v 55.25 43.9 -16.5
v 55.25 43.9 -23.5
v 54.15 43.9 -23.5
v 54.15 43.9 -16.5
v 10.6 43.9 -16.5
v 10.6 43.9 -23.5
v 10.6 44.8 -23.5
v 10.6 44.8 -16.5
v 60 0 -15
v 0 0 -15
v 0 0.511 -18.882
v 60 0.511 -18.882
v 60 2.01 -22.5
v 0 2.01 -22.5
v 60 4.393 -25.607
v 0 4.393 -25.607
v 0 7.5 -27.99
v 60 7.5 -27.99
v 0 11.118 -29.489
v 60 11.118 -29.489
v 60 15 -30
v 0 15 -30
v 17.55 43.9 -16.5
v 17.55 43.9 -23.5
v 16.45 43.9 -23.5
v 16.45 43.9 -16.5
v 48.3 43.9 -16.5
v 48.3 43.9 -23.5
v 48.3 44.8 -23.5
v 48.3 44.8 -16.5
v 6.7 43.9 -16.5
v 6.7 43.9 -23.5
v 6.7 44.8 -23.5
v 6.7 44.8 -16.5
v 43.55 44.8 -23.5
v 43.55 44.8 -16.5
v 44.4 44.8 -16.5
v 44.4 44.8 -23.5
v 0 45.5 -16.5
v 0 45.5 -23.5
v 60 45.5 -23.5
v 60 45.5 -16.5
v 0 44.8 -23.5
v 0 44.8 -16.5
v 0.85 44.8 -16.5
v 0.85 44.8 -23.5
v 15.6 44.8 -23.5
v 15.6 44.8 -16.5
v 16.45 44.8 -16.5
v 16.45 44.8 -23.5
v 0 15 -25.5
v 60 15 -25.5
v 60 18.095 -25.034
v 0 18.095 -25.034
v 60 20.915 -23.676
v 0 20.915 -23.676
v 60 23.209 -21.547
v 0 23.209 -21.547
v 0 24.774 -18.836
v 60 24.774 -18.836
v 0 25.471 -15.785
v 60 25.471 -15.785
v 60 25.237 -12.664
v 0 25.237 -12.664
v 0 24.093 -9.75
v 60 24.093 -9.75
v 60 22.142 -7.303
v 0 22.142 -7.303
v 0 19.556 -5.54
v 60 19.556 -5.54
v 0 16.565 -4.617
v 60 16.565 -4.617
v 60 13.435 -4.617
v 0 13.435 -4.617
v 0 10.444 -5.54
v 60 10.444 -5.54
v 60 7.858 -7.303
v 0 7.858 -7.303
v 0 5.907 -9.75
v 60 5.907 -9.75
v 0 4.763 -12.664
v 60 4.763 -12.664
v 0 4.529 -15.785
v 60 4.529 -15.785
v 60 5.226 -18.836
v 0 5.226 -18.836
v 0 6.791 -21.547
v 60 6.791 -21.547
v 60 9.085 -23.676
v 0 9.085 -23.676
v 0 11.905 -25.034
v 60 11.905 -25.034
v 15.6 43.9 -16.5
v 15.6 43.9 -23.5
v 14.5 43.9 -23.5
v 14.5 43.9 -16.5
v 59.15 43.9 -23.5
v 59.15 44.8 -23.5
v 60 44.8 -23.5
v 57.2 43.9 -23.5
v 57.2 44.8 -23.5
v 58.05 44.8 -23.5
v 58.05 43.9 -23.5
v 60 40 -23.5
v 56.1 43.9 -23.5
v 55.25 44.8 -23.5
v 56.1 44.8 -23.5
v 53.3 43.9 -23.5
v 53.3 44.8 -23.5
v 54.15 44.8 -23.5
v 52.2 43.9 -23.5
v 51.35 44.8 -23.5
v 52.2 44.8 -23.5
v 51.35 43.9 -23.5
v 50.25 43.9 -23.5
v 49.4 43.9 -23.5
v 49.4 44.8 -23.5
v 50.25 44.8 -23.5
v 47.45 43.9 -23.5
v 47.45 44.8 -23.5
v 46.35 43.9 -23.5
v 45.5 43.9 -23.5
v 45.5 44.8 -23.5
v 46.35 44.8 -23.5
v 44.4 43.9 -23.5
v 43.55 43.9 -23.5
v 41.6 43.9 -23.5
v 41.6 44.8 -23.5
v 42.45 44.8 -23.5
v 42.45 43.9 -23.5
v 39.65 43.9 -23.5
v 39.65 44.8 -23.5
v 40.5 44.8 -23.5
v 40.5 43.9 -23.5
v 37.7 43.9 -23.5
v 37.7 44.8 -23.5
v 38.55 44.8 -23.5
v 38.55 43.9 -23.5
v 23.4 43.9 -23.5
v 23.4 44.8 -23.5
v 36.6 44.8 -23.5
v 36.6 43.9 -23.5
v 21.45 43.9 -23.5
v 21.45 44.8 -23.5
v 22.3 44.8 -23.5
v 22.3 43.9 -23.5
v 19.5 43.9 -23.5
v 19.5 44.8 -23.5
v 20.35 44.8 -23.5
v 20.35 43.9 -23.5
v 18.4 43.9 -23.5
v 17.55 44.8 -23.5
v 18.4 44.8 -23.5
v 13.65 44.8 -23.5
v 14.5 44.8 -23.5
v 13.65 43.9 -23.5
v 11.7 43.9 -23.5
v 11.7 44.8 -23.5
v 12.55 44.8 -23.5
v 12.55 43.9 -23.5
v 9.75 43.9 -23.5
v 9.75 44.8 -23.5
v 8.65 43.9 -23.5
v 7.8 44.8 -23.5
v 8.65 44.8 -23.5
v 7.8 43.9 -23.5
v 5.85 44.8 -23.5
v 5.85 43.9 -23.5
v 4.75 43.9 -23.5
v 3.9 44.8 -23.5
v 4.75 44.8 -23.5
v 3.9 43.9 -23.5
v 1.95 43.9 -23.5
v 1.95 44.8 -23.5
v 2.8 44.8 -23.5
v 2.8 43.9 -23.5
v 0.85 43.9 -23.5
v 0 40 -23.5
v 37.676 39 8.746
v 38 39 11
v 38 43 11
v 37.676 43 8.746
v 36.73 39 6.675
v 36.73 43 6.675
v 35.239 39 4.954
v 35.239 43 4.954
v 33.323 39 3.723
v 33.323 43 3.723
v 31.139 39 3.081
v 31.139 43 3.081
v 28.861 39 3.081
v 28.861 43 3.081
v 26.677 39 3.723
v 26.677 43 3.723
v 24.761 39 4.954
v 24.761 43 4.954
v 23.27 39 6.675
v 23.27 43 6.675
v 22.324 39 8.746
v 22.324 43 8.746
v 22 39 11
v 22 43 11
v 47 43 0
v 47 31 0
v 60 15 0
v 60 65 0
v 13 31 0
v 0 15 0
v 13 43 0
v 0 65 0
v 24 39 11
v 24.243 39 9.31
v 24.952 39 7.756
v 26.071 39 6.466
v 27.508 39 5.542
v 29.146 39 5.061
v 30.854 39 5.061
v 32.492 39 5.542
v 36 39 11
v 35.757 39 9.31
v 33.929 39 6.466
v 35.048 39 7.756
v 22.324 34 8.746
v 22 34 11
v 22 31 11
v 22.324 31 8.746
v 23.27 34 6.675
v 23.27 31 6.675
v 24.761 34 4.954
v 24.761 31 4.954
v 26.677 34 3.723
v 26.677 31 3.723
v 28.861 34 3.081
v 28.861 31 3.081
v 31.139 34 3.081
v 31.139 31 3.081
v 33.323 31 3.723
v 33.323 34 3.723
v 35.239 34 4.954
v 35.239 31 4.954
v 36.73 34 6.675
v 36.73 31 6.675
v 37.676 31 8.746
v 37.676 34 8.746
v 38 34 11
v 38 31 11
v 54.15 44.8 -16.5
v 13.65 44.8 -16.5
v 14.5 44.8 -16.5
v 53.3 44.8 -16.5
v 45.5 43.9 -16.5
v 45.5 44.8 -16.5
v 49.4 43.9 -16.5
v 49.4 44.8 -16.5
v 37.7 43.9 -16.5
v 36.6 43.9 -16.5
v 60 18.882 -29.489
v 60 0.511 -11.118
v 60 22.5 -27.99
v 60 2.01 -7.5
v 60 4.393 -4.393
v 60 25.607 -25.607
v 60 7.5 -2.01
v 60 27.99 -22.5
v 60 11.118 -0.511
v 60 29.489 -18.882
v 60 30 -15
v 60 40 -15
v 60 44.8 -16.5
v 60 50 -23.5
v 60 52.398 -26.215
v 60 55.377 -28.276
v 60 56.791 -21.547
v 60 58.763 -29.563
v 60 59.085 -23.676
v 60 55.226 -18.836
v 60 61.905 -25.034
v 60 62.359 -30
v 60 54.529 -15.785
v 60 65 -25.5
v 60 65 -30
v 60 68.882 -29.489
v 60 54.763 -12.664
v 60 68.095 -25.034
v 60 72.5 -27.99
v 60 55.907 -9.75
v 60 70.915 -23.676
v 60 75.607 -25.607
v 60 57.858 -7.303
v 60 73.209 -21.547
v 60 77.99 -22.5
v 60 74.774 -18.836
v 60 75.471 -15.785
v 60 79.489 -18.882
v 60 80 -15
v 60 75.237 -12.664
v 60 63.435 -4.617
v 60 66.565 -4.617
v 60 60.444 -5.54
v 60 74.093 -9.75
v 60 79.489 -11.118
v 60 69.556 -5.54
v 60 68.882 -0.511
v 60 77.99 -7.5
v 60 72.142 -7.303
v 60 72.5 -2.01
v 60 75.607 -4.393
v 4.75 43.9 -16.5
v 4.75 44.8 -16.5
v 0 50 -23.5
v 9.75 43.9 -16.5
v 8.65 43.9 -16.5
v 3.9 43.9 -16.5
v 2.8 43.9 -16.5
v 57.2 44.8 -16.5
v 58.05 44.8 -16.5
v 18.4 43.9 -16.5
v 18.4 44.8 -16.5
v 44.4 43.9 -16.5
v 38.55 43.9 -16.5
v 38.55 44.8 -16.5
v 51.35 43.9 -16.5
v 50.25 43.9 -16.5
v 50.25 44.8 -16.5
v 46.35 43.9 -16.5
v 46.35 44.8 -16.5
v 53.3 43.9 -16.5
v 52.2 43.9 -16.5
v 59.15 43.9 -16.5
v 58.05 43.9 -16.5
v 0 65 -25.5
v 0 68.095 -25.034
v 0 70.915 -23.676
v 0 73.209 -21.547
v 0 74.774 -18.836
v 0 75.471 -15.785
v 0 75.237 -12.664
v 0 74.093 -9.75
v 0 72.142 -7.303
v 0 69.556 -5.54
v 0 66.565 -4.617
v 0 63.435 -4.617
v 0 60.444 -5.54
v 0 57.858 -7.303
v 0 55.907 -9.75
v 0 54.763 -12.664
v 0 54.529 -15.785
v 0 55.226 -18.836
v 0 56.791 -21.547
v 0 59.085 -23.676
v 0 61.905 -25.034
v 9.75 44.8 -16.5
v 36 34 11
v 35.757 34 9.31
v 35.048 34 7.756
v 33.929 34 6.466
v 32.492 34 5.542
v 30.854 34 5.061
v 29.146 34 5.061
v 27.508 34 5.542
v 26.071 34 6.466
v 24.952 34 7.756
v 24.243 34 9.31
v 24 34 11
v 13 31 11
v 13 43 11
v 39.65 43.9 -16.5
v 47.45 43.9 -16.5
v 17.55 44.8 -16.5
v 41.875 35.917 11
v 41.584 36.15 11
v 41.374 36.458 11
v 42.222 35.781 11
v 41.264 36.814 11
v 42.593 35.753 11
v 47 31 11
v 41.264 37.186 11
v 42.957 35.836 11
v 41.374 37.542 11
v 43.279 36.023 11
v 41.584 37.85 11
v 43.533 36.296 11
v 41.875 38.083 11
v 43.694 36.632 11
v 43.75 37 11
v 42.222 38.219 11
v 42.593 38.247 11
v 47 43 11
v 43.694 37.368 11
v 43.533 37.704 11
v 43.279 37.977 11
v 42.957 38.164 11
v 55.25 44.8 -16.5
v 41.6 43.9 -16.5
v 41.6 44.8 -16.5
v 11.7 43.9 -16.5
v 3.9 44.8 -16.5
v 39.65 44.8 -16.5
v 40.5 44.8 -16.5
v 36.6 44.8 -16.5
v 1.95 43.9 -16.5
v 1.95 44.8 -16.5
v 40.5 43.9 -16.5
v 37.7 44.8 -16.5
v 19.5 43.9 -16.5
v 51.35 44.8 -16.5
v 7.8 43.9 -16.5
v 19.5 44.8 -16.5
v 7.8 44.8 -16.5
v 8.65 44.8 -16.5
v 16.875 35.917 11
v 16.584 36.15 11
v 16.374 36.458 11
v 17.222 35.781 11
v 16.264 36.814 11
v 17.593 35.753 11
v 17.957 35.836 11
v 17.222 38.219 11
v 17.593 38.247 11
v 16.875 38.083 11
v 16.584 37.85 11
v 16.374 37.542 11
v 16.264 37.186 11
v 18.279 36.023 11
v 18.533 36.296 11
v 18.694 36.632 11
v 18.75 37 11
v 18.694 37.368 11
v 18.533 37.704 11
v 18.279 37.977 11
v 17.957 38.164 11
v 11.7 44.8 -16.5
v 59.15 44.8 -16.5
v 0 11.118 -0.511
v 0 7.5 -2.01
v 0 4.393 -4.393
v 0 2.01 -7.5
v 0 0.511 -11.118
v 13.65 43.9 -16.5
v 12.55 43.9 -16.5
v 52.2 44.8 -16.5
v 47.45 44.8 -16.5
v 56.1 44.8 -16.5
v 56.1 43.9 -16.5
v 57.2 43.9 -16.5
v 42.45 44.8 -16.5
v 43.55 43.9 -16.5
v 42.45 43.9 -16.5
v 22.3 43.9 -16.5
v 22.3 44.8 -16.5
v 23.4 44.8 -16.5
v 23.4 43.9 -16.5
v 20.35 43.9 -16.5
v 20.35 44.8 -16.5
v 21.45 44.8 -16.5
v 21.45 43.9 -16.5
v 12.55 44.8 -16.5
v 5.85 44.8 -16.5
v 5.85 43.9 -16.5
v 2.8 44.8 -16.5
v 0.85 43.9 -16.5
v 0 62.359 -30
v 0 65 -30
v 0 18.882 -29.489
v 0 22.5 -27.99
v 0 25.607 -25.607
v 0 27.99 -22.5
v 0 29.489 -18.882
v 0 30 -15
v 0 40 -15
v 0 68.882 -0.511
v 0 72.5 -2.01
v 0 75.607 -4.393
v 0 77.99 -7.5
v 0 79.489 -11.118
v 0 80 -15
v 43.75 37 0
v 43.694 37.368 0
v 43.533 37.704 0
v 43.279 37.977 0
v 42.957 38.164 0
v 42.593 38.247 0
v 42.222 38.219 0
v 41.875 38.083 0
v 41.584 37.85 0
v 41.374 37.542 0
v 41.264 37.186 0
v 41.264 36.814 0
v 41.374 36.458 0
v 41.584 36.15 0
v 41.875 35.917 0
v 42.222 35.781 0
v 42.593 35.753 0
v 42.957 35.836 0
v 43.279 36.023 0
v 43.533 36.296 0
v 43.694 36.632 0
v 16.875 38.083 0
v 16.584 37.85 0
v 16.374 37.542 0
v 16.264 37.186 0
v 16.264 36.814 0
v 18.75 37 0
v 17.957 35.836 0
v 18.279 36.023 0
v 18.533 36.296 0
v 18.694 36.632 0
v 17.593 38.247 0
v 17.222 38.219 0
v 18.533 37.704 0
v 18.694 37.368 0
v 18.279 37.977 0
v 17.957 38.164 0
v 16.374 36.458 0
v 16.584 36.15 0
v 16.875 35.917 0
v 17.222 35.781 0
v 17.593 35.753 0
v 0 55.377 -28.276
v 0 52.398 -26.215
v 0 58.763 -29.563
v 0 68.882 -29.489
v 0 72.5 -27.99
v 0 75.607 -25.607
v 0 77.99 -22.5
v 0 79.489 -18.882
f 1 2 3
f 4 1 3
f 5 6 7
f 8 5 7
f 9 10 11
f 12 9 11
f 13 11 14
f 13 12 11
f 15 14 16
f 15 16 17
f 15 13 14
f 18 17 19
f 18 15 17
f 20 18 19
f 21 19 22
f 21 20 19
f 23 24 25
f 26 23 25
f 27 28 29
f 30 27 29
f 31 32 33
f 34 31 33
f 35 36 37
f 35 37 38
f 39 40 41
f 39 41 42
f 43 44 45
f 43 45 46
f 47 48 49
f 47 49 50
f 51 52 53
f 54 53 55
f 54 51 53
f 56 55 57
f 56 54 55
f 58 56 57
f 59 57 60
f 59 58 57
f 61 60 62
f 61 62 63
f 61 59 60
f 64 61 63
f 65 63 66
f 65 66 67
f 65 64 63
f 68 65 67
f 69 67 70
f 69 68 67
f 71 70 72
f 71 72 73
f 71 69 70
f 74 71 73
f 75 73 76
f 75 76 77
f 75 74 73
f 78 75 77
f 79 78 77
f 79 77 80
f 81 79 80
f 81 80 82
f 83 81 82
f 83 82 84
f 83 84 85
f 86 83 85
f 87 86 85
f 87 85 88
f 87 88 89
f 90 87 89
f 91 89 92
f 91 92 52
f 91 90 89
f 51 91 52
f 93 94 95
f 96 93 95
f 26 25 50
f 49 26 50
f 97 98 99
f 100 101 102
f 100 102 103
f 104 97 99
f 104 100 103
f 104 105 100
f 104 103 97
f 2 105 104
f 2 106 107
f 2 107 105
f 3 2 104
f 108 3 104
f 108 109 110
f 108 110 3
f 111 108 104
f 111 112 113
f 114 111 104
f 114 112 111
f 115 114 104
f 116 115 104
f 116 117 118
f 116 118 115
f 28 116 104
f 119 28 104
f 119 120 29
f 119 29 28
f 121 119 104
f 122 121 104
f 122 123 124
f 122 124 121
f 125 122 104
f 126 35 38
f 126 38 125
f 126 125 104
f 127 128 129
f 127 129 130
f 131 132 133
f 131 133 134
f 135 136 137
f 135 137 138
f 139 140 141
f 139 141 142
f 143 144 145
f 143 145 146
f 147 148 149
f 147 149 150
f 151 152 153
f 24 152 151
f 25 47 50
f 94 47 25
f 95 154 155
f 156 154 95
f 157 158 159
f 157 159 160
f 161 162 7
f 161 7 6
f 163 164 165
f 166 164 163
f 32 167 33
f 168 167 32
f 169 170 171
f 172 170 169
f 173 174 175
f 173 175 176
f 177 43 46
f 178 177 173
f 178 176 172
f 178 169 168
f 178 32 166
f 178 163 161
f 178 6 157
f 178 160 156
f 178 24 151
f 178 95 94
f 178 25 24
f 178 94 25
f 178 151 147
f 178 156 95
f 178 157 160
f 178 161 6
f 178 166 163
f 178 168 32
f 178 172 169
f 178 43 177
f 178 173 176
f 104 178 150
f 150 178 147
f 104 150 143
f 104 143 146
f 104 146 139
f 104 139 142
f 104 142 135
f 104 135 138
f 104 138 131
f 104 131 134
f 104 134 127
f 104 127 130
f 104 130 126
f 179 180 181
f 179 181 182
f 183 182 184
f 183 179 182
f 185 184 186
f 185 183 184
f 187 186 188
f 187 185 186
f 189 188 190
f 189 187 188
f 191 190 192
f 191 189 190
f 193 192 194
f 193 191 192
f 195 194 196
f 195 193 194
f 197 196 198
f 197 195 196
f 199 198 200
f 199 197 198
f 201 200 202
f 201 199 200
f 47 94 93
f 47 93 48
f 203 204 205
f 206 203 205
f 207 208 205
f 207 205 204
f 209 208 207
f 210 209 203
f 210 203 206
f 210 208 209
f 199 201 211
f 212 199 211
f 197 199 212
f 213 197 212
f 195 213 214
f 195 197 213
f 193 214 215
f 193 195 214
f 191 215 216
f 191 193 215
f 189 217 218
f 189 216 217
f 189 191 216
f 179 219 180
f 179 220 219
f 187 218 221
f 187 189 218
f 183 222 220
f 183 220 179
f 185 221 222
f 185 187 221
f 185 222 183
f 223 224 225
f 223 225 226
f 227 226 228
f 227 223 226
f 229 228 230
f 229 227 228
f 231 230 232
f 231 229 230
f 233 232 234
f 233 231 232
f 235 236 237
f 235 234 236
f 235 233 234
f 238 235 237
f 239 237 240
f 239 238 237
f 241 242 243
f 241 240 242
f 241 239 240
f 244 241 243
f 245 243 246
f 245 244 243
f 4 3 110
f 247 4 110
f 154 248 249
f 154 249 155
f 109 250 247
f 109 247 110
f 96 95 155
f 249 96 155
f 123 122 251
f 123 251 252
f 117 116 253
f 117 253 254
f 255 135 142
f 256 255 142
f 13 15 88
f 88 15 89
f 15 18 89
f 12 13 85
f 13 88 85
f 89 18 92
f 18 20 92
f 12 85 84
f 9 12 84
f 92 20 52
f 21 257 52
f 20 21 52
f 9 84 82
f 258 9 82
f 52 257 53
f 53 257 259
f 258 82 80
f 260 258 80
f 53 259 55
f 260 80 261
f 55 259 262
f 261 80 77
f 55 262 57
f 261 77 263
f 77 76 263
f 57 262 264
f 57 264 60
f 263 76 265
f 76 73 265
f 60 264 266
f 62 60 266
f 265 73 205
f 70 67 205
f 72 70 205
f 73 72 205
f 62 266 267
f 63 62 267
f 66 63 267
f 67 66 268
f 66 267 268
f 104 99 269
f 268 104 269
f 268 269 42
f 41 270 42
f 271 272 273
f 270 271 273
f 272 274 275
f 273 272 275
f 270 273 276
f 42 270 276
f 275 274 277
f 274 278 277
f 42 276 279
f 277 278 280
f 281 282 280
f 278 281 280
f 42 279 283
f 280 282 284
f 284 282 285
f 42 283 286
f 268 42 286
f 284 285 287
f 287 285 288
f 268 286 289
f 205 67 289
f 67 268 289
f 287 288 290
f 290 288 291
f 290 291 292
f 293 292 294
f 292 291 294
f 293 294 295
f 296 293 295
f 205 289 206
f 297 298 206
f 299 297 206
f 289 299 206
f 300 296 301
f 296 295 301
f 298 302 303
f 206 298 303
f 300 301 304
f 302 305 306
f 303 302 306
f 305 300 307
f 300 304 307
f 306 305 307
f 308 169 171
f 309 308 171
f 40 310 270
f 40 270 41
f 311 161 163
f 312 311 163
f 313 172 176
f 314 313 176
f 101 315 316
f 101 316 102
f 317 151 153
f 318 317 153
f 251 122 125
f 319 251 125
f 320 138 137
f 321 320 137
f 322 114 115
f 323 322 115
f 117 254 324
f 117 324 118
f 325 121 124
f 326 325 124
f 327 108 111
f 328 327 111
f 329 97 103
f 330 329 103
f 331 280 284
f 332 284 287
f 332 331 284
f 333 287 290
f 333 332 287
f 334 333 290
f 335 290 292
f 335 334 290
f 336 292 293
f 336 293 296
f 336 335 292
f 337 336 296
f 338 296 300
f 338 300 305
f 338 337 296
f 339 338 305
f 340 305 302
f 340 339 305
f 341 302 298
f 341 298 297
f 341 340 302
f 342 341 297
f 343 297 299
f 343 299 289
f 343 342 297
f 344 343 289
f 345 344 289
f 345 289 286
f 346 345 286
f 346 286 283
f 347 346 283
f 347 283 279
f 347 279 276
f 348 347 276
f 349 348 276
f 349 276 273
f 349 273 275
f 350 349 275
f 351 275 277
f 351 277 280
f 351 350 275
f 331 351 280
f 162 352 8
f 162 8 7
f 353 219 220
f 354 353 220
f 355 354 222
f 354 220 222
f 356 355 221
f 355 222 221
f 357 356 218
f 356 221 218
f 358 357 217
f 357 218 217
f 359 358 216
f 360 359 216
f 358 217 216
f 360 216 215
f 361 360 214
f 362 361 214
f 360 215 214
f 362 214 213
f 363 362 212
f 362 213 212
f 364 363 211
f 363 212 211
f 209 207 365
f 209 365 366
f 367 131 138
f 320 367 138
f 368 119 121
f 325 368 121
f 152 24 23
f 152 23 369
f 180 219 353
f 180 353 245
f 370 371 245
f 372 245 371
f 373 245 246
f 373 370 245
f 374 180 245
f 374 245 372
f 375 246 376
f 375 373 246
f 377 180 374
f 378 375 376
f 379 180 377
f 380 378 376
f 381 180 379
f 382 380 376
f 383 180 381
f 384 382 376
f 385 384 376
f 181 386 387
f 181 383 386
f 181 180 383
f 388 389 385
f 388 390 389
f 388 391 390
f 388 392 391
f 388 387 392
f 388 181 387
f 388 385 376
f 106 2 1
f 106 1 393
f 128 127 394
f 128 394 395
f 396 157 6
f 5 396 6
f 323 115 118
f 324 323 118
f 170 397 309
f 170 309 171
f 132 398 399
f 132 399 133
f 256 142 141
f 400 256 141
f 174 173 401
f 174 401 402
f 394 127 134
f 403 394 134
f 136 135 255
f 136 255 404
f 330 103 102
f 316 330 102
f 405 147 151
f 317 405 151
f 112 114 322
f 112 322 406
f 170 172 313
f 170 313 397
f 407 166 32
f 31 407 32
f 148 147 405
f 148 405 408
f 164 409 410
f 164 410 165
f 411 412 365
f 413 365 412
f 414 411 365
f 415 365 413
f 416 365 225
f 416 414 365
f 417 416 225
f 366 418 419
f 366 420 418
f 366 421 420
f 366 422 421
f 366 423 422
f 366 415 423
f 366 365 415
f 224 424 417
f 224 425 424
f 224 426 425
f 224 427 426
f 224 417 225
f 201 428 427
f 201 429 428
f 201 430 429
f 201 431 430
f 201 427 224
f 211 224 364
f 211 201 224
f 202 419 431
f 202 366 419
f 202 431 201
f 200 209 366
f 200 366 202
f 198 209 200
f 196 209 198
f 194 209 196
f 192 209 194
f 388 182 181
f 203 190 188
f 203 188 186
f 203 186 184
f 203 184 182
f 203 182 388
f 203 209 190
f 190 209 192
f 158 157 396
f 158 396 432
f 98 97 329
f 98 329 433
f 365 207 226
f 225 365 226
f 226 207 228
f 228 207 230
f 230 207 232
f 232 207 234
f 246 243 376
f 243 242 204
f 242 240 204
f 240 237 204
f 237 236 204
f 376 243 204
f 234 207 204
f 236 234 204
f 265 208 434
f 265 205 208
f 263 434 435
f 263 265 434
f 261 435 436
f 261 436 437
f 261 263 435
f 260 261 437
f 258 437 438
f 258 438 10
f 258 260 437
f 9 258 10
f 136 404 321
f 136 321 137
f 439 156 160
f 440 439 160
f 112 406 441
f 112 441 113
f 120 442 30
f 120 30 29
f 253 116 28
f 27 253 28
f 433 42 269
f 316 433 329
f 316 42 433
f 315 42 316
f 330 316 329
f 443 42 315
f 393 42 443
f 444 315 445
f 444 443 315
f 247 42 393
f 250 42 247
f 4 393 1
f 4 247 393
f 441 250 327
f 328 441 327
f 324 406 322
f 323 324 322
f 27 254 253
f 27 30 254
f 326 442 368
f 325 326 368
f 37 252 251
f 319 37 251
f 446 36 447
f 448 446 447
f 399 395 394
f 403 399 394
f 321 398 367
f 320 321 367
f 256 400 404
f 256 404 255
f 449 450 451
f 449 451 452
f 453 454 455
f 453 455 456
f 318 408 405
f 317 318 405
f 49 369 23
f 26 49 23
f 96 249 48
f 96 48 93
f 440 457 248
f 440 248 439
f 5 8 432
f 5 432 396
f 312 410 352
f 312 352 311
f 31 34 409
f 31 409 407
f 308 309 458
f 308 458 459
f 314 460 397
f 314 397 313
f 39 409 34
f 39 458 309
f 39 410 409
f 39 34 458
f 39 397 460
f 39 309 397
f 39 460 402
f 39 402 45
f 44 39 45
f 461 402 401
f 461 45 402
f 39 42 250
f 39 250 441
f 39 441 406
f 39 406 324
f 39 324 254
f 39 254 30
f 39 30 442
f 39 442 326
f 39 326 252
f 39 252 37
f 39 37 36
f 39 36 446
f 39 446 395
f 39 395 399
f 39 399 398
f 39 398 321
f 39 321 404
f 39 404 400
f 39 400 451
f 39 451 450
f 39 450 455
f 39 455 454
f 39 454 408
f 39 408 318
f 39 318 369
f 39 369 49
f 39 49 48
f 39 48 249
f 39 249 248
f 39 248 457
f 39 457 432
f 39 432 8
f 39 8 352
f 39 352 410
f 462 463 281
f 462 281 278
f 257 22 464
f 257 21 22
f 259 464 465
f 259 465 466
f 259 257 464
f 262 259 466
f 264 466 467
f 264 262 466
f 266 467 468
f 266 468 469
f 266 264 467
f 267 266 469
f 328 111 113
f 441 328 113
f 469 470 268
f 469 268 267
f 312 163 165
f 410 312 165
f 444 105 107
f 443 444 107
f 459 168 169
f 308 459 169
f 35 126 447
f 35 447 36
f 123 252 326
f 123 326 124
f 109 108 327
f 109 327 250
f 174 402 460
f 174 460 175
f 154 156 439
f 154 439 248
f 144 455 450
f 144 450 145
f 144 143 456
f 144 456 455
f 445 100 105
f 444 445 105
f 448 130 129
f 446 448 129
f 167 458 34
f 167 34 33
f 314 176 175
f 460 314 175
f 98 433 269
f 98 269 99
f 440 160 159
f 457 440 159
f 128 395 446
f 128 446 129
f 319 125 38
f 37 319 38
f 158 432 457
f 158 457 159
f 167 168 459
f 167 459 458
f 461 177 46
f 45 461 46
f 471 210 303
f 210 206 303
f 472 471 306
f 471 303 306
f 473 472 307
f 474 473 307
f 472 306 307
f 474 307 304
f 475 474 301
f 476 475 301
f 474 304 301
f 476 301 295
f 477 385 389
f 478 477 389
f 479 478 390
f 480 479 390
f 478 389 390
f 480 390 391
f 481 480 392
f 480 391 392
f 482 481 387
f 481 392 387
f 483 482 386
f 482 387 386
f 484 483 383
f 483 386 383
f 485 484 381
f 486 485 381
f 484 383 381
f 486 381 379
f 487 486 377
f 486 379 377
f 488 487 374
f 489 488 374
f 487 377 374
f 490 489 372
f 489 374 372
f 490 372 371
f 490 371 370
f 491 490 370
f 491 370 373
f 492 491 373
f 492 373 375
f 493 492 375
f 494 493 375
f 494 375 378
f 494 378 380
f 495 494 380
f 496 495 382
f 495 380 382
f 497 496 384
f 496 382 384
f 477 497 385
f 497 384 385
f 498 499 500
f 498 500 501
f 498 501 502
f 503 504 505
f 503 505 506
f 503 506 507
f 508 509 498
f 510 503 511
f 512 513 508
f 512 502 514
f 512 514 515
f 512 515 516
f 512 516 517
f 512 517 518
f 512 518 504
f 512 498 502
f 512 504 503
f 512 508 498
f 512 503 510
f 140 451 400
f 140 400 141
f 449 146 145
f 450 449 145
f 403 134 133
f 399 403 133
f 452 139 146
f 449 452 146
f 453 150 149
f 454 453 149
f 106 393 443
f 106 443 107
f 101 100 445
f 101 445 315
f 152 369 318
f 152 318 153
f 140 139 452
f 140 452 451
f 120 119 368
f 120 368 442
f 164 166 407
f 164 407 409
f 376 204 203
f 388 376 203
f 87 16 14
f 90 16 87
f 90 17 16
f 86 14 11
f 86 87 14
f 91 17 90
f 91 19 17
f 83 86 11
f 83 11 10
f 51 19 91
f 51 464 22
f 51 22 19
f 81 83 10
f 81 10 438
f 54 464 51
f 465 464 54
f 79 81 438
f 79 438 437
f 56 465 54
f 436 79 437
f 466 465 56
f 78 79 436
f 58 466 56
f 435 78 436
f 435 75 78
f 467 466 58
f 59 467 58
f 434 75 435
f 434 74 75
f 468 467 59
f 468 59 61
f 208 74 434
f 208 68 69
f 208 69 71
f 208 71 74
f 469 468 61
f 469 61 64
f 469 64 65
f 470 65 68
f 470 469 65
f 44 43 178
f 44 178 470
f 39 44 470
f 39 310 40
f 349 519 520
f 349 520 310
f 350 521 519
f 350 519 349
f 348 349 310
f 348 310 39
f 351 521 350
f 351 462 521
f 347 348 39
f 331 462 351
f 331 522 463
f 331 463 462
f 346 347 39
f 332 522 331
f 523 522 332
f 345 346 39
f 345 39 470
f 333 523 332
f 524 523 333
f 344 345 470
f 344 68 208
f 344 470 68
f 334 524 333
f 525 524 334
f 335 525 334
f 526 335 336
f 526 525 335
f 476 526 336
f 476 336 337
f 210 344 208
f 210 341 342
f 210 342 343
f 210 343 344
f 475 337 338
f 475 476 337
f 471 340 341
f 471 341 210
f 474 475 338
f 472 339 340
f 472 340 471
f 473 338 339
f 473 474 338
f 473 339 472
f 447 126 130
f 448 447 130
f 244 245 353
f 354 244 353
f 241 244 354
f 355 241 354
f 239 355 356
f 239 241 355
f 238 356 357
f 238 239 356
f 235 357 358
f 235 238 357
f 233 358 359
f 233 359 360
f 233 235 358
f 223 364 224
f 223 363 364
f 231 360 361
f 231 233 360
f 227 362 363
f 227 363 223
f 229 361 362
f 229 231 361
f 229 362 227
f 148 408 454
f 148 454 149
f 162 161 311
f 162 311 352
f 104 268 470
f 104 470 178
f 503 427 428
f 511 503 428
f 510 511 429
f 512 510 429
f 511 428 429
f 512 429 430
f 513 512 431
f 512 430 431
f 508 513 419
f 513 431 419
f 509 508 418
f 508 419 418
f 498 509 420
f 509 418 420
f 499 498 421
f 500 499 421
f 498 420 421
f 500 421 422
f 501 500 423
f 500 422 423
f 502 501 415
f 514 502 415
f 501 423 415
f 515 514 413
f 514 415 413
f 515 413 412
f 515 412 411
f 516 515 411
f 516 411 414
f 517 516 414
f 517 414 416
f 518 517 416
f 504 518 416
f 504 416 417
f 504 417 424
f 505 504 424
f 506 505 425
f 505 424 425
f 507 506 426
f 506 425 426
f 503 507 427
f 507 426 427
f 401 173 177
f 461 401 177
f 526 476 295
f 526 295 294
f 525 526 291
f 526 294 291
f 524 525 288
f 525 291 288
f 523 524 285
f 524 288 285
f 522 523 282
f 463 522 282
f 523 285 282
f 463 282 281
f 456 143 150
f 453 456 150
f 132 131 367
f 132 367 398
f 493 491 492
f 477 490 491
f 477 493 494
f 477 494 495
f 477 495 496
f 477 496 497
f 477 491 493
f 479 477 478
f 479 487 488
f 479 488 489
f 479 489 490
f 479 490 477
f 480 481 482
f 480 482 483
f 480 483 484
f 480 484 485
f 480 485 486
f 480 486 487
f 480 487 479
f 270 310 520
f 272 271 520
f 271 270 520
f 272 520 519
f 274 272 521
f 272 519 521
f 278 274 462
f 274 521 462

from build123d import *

# Parameters (mm, degrees)
SKETCH_1_R               = 10.5
EXTRUDE_2_DEPTH          = 60
FILLET_1_R               = 15
FILLET_5_R               = 15
FILLET_3_R               = 15
SKETCH_2_W               = 34
SKETCH_2_H               = 12
EXTRUDE_3_DEPTH          = 11
CUT_EXTRUDE_1_DEPTH      = 12
CUT_EXTRUDE_2_DEPTH      = 80.680612447
CUT_EXTRUDE_2_DEPTH_BACK = 4
CUT_EXTRUDE_3_DEPTH      = 84.072257704
CUT_EXTRUDE_3_DEPTH_BACK = 3
SKETCH_6_R               = 1.25
CUT_EXTRUDE_4_DEPTH      = 11
FILLET_10_R              = 15
FILLET_11_R              = 15
FILLET_13_R              = 15
SKETCH_9_W               = 1.1
SKETCH_9_H               = 0.9
CUT_EXTRUDE_6_DEPTH      = 7
SKETCH_11_W              = 1.1
SKETCH_11_H              = 0.9
CUT_EXTRUDE_7_DEPTH      = 7


# Some blends are built 0.0001 mm under size
with BuildPart() as part:
    # Эскиз1 → Бобышка-Вытянуть2 (new body)
    with BuildSketch(Plane(origin=(0, 0, 0), x_dir=(0, 0, -1), z_dir=(1, 0, 0))):
        Polygon((0, 0), (0, 80), (30, 80), (30, 50), (23.5, 50), (23.5, 45.5), (16.5, 45.5), (16.5, 44.8), (23.5, 44.8), (23.5, 40), (16.5, 40), (15, 40), (15, 30), (30, 30), (30, 0), align=None)
        with Locations((15, 15)):
            Circle(SKETCH_1_R, mode=Mode.SUBTRACT)
        with Locations((15, 65)):
            Circle(SKETCH_1_R, mode=Mode.SUBTRACT)
    extrude(amount=EXTRUDE_2_DEPTH)

    # Скругление1
    fillet_1_edges = [part.edges().sort_by_distance(p)[0] for p in [
        (30, 30, -30),
    ]]
    fillet(fillet_1_edges, radius=FILLET_1_R - 0.0001)  # a hair under: the kernel refuses the full size

    # Скругление5
    fillet_5_edges = [part.edges().sort_by_distance(p)[0] for p in [
        (30, 80, -30),
    ]]
    fillet(fillet_5_edges, radius=FILLET_5_R)

    # Скругление3
    fillet_3_edges = [part.edges().sort_by_distance(p)[0] for p in [
        (30, 0, -30),
    ]]
    fillet(fillet_3_edges, radius=FILLET_3_R)

    # Эскиз2 → Бобышка-Вытянуть3 (add)
    with BuildSketch(Plane.XY):
        with Locations((30, 37)):
            Rectangle(SKETCH_2_W, SKETCH_2_H)
    extrude(amount=EXTRUDE_3_DEPTH)

    # Эскиз3 → Вырез-Вытянуть1 (cut)
    with BuildSketch(Plane(origin=(0, 43, 0), x_dir=(1, 0, 0), z_dir=(0, 1, 0))):
        with BuildLine():
            ThreePointArc((36, -11), (30, -5), (24, -11))
            Line((24, -11), (36, -11))
        make_face()
    extrude(amount=-CUT_EXTRUDE_1_DEPTH, mode=Mode.SUBTRACT)

    # Эскиз4 → Вырез-Вытянуть2 (cut, two sides: drawn at the far end of the back side and taken through both)
    with BuildSketch(Plane(origin=(0, 43, 0), x_dir=(1, 0, 0), z_dir=(0, 1, 0)).offset(-CUT_EXTRUDE_2_DEPTH_BACK)):
        with BuildLine():
            Line((38, -132.803398875), (38, -11))
            ThreePointArc((38, -11), (30, -3), (22, -11))
            Line((22, -11), (22, -132.803398875))
            Line((22, -132.803398875), (22, -376.410196625))
            Line((22, -376.410196625), (38, -376.410196625))
            Line((38, -376.410196625), (38, -132.803398875))
        make_face()
    extrude(amount=CUT_EXTRUDE_2_DEPTH + CUT_EXTRUDE_2_DEPTH_BACK, mode=Mode.SUBTRACT)

    # Эскиз5 → Вырез-Вытянуть3 (cut, two sides: drawn at the far end of the back side and taken through both)
    with BuildSketch(Plane(origin=(0, 31, 0), x_dir=(-1, 0, 0), z_dir=(0, -1, 0)).offset(-CUT_EXTRUDE_3_DEPTH_BACK)):
        with BuildLine():
            Line((-22, -132.803398875), (-22, -11))
            ThreePointArc((-22, -11), (-30, -3), (-38, -11))
            Line((-38, -11), (-38, -132.803398875))
            Line((-38, -132.803398875), (-38, -376.410196625))
            Line((-38, -376.410196625), (-22, -376.410196625))
            Line((-22, -376.410196625), (-22, -132.803398875))
        make_face()
    extrude(amount=CUT_EXTRUDE_3_DEPTH + CUT_EXTRUDE_3_DEPTH_BACK, mode=Mode.SUBTRACT)

    # Эскиз6 → Вырез-Вытянуть4 (cut)
    with BuildSketch(Plane.XY.offset(11)):
        with Locations((17.5, 37)):
            Circle(SKETCH_6_R)
        with Locations((42.5, 37)):
            Circle(SKETCH_6_R)
    extrude(amount=-CUT_EXTRUDE_4_DEPTH, mode=Mode.SUBTRACT)

    # Скругление10
    fillet_10_edges = [part.edges().sort_by_distance(p)[0] for p in [
        (30, 80, 0),
    ]]
    fillet(fillet_10_edges, radius=FILLET_10_R - 0.0001)  # a hair under: the kernel refuses the full size

    # Скругление11
    fillet_11_edges = [part.edges().sort_by_distance(p)[0] for p in [
        (30, 0, 0),
    ]]
    fillet(fillet_11_edges, radius=FILLET_11_R - 0.0001)  # a hair under: the kernel refuses the full size

    # Скругление13
    # the kernel refuses this fillet: 15 mm, written as the material it takes off along each edge
    with BuildSketch(Plane(origin=(-30.898017736, 50, -30), x_dir=(0, 1, 0), z_dir=(1, 0, 0))) as fillet_13_piece_1:
        with BuildLine():
            CenterArc((12.359207094, 15), FILLET_13_R, 214.518107841, 55.481892159)
            Line((0, 6.5), (-0.247184142, 6.33))
            ThreePointArc((-0.247184142, 6.33), (-0.3, 3.25), (-0.3, 0))
            Line((-0.3, 0), (0, -0.3))
            Line((0, -0.3), (12.359207094, -0.3))
            Line((12.359207094, -0.3), (12.359207094, 0))
        make_face()
    extrude(amount=121.796035472, mode=Mode.SUBTRACT)

    # Эскиз9 → Вырез-Вытянуть6 (cut)
    with BuildSketch(Plane(origin=(0, 0, -23.5), x_dir=(-1, 0, 0), z_dir=(0, 0, -1))):
        with Locations((-58.6, 44.35)):
            Rectangle(SKETCH_9_W, SKETCH_9_H)
        with Locations((-56.65, 44.35)):
            Rectangle(SKETCH_9_W, SKETCH_9_H)
        with Locations((-54.7, 44.35)):
            Rectangle(SKETCH_9_W, SKETCH_9_H)
        with Locations((-52.75, 44.35)):
            Rectangle(SKETCH_9_W, SKETCH_9_H)
        with Locations((-50.8, 44.35)):
            Rectangle(SKETCH_9_W, SKETCH_9_H)
        with Locations((-48.85, 44.35)):
            Rectangle(SKETCH_9_W, SKETCH_9_H)
        with Locations((-46.9, 44.35)):
            Rectangle(SKETCH_9_W, SKETCH_9_H)
        with Locations((-44.95, 44.35)):
            Rectangle(SKETCH_9_W, SKETCH_9_H)
        with Locations((-43, 44.35)):
            Rectangle(SKETCH_9_W, SKETCH_9_H)
        with Locations((-41.05, 44.35)):
            Rectangle(SKETCH_9_W, SKETCH_9_H)
        with Locations((-39.1, 44.35)):
            Rectangle(SKETCH_9_W, SKETCH_9_H)
        with Locations((-37.15, 44.35)):
            Rectangle(SKETCH_9_W, SKETCH_9_H)
    extrude(amount=-CUT_EXTRUDE_6_DEPTH, mode=Mode.SUBTRACT)

    # Эскиз11 → Вырез-Вытянуть7 (cut)
    with BuildSketch(Plane(origin=(0, 0, -23.5), x_dir=(-1, 0, 0), z_dir=(0, 0, -1))):
        with Locations((-1.4, 44.35)):
            Rectangle(SKETCH_11_W, SKETCH_11_H)
        with Locations((-3.35, 44.35)):
            Rectangle(SKETCH_11_W, SKETCH_11_H)
        with Locations((-5.3, 44.35)):
            Rectangle(SKETCH_11_W, SKETCH_11_H)
        with Locations((-7.25, 44.35)):
            Rectangle(SKETCH_11_W, SKETCH_11_H)
        with Locations((-9.2, 44.35)):
            Rectangle(SKETCH_11_W, SKETCH_11_H)
        with Locations((-11.15, 44.35)):
            Rectangle(SKETCH_11_W, SKETCH_11_H)
        with Locations((-13.1, 44.35)):
            Rectangle(SKETCH_11_W, SKETCH_11_H)
        with Locations((-15.05, 44.35)):
            Rectangle(SKETCH_11_W, SKETCH_11_H)
        with Locations((-17, 44.35)):
            Rectangle(SKETCH_11_W, SKETCH_11_H)
        with Locations((-18.95, 44.35)):
            Rectangle(SKETCH_11_W, SKETCH_11_H)
        with Locations((-20.9, 44.35)):
            Rectangle(SKETCH_11_W, SKETCH_11_H)
        with Locations((-22.85, 44.35)):
            Rectangle(SKETCH_11_W, SKETCH_11_H)
    extrude(amount=-CUT_EXTRUDE_7_DEPTH, mode=Mode.SUBTRACT)


solid = part.part
